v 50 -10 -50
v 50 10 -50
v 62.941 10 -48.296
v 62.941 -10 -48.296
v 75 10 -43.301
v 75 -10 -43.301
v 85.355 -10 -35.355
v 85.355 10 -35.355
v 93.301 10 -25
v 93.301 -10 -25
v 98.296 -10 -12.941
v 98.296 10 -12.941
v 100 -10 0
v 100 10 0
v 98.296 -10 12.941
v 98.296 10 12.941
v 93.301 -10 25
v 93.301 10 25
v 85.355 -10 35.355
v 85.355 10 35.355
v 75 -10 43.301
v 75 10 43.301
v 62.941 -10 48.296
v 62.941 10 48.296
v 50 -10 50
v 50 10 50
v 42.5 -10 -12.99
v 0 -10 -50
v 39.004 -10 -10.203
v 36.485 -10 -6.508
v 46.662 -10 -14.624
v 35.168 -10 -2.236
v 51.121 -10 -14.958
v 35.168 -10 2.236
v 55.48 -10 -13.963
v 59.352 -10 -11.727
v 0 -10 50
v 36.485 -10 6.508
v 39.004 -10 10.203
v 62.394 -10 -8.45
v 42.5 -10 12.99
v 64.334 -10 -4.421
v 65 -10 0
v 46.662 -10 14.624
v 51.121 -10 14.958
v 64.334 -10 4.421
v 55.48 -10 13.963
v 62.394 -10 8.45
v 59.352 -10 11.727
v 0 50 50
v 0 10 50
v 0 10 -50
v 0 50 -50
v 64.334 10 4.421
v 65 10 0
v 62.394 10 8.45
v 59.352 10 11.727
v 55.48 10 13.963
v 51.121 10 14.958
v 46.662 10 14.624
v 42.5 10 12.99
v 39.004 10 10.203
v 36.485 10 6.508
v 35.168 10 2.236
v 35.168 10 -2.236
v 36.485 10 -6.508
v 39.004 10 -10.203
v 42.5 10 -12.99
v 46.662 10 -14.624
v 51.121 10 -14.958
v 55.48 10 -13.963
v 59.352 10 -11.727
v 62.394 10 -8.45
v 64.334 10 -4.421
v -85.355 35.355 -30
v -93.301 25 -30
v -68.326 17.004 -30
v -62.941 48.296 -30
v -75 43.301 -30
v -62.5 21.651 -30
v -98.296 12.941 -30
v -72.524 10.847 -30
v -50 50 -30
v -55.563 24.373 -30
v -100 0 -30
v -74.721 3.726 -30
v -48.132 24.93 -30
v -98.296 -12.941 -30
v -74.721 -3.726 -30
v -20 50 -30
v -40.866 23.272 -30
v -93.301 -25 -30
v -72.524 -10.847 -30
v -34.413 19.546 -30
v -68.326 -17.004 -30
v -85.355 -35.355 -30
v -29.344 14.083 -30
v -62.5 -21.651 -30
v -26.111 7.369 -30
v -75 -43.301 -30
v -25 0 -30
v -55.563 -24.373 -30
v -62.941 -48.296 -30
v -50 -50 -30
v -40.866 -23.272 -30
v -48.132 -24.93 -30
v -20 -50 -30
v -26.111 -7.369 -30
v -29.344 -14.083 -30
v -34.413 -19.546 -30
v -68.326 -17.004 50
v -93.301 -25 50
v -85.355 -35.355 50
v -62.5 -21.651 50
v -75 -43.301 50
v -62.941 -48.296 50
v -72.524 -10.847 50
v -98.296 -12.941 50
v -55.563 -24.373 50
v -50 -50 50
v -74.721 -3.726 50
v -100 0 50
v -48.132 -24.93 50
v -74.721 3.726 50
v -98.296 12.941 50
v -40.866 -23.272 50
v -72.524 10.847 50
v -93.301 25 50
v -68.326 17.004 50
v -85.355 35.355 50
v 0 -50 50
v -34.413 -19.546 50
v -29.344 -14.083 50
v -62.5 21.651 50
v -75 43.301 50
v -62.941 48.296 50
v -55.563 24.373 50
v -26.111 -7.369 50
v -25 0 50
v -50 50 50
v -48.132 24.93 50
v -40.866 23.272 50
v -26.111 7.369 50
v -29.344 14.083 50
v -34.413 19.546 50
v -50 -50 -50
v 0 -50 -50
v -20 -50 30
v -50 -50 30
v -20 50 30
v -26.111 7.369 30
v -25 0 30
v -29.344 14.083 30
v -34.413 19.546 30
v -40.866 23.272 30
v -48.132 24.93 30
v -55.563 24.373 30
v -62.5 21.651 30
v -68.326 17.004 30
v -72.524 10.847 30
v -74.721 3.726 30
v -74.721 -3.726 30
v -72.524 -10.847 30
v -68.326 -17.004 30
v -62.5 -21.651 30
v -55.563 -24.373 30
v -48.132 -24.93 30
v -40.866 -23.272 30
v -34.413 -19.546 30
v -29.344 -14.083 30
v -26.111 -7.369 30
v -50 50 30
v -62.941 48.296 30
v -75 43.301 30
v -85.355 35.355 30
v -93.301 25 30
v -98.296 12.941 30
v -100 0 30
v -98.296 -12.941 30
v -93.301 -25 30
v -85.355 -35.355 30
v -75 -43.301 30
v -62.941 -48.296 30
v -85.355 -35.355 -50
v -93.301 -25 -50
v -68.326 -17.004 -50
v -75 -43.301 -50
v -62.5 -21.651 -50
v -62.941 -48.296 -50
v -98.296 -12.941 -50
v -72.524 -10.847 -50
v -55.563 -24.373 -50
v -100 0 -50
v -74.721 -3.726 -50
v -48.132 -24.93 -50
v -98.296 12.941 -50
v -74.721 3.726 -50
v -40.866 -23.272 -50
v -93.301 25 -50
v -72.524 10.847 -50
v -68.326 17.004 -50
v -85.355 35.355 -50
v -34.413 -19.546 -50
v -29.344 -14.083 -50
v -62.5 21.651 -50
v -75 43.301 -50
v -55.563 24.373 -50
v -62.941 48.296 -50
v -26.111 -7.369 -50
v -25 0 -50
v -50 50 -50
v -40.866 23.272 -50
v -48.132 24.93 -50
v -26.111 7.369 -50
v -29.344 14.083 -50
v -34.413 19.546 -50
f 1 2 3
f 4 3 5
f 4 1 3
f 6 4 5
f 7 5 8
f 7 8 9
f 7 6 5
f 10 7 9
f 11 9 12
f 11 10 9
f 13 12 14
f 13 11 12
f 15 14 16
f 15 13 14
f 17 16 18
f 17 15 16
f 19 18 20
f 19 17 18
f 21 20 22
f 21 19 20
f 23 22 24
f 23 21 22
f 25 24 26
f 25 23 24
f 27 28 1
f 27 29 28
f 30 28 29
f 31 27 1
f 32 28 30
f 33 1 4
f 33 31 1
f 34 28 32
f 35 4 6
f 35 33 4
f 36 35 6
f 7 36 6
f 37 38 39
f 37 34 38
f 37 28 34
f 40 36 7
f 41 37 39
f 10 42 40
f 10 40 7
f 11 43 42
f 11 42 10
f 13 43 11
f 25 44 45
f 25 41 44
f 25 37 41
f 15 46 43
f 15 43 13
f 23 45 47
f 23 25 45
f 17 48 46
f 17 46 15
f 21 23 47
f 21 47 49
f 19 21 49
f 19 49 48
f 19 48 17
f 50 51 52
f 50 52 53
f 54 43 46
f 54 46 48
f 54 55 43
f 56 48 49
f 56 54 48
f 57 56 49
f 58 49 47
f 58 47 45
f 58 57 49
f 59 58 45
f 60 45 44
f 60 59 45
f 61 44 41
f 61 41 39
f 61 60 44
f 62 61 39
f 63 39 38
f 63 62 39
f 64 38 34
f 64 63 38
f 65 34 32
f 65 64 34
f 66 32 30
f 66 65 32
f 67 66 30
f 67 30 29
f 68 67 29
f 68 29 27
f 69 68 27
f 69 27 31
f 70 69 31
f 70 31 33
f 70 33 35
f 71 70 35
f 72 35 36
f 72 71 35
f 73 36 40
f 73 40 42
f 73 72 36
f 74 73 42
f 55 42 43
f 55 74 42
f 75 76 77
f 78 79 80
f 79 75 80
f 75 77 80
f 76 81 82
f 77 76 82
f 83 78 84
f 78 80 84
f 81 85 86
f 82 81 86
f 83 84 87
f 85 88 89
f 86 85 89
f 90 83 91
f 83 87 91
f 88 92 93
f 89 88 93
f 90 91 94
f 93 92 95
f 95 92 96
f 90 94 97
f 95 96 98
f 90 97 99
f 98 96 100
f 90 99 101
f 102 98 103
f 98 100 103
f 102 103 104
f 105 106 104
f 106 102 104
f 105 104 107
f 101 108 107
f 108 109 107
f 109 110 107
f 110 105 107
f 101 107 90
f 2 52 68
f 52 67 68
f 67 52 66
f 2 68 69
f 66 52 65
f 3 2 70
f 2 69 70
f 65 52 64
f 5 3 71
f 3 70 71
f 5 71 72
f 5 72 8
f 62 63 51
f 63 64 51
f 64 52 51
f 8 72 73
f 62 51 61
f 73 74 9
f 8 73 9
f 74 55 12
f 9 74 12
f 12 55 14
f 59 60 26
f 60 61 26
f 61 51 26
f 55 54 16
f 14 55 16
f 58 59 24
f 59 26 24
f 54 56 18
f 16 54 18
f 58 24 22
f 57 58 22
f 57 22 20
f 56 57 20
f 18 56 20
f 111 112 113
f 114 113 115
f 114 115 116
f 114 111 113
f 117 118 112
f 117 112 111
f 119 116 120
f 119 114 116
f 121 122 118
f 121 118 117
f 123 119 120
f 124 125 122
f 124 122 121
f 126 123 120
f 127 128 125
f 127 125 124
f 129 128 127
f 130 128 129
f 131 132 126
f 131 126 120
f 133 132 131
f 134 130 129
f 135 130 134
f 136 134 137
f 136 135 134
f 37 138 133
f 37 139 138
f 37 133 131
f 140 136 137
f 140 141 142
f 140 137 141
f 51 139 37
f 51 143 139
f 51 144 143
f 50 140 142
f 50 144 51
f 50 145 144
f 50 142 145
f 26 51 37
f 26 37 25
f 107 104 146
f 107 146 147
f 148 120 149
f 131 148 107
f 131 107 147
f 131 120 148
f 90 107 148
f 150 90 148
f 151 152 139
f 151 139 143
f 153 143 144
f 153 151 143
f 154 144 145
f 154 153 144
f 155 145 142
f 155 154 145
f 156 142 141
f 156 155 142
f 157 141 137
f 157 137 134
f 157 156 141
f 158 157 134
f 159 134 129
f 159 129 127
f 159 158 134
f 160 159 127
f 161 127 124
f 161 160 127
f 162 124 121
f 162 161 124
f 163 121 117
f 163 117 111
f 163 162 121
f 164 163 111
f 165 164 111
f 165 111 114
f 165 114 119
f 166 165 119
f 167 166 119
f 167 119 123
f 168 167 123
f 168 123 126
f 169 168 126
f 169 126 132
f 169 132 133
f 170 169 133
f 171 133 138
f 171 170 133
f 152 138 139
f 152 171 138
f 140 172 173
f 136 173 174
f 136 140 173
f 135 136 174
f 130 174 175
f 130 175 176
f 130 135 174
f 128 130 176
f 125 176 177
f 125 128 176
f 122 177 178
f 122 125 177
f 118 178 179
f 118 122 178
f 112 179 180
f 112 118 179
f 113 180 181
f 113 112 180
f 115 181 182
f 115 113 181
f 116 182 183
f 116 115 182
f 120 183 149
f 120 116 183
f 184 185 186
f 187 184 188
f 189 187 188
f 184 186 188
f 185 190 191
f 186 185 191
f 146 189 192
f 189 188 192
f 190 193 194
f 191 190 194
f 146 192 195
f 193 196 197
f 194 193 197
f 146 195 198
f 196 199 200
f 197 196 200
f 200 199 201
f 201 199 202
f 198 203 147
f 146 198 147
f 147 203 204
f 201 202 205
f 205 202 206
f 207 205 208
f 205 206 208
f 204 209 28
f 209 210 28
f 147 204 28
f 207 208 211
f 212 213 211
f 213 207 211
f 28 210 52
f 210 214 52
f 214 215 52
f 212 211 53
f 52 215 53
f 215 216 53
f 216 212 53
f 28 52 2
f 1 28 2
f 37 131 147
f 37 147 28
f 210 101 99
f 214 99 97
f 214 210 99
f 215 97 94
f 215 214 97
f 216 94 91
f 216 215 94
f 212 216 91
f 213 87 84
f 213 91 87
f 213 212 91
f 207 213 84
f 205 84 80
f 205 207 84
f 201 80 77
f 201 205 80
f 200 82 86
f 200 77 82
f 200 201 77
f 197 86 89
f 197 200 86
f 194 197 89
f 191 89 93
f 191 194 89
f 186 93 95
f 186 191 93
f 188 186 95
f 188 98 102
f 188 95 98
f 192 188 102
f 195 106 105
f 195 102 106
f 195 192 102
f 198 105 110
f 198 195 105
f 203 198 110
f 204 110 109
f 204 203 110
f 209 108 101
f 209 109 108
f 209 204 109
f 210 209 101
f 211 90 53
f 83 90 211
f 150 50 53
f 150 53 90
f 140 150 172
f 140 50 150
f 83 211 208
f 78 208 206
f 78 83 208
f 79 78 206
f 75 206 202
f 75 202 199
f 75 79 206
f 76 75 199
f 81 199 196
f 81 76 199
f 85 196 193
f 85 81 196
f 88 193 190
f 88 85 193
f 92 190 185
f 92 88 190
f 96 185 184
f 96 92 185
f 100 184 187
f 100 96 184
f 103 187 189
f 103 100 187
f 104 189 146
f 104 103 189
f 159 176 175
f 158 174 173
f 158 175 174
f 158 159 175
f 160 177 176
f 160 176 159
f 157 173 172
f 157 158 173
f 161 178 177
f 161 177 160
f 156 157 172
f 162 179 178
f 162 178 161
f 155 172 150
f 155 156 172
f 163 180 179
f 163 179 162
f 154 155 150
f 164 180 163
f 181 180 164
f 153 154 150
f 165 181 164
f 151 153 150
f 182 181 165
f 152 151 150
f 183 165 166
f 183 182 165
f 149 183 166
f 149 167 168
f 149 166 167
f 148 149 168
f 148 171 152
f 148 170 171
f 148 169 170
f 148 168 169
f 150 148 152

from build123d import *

# Parameters (mm, degrees)
F0_R     = 25
F1_DEPTH = 50
F2_R     = 15
F3_DEPTH = 10
F4_W     = 80
F4_H     = 60
F5_DEPTH = 100


with BuildPart() as f1:
    # F0 (on Top) → F1 (new body, symmetric)
    with BuildSketch(Plane.XY):
        with BuildLine():
            Line((0, 50), (-50, 50))
            ThreePointArc((-50, 50), (-100, 0), (-50, -50))
            Line((-50, -50), (0, -50))
            Line((0, -50), (0, 50))
        make_face()
        with Locations((-50, 0)):
            Circle(F0_R, mode=Mode.SUBTRACT)
    extrude(amount=F1_DEPTH, both=True)

    # F2 (on Front) → F3 (join, symmetric)
    with BuildSketch(Plane.XZ):
        with BuildLine():
            Line((0, -50), (50, -50))
            ThreePointArc((50, -50), (100, 0), (50, 50))
            Line((50, 50), (0, 50))
            Line((0, 50), (0, -50))
        make_face()
        with Locations((50, 0)):
            Circle(F2_R, mode=Mode.SUBTRACT)
    extrude(amount=F3_DEPTH, both=True)

    # F4 (on Front) → F5 (cut, symmetric)
    with BuildSketch(Plane.XZ):
        with Locations((-60, 0)):
            Rectangle(F4_W, F4_H)
    extrude(amount=F5_DEPTH, both=True, mode=Mode.SUBTRACT)


solid = f1.part
